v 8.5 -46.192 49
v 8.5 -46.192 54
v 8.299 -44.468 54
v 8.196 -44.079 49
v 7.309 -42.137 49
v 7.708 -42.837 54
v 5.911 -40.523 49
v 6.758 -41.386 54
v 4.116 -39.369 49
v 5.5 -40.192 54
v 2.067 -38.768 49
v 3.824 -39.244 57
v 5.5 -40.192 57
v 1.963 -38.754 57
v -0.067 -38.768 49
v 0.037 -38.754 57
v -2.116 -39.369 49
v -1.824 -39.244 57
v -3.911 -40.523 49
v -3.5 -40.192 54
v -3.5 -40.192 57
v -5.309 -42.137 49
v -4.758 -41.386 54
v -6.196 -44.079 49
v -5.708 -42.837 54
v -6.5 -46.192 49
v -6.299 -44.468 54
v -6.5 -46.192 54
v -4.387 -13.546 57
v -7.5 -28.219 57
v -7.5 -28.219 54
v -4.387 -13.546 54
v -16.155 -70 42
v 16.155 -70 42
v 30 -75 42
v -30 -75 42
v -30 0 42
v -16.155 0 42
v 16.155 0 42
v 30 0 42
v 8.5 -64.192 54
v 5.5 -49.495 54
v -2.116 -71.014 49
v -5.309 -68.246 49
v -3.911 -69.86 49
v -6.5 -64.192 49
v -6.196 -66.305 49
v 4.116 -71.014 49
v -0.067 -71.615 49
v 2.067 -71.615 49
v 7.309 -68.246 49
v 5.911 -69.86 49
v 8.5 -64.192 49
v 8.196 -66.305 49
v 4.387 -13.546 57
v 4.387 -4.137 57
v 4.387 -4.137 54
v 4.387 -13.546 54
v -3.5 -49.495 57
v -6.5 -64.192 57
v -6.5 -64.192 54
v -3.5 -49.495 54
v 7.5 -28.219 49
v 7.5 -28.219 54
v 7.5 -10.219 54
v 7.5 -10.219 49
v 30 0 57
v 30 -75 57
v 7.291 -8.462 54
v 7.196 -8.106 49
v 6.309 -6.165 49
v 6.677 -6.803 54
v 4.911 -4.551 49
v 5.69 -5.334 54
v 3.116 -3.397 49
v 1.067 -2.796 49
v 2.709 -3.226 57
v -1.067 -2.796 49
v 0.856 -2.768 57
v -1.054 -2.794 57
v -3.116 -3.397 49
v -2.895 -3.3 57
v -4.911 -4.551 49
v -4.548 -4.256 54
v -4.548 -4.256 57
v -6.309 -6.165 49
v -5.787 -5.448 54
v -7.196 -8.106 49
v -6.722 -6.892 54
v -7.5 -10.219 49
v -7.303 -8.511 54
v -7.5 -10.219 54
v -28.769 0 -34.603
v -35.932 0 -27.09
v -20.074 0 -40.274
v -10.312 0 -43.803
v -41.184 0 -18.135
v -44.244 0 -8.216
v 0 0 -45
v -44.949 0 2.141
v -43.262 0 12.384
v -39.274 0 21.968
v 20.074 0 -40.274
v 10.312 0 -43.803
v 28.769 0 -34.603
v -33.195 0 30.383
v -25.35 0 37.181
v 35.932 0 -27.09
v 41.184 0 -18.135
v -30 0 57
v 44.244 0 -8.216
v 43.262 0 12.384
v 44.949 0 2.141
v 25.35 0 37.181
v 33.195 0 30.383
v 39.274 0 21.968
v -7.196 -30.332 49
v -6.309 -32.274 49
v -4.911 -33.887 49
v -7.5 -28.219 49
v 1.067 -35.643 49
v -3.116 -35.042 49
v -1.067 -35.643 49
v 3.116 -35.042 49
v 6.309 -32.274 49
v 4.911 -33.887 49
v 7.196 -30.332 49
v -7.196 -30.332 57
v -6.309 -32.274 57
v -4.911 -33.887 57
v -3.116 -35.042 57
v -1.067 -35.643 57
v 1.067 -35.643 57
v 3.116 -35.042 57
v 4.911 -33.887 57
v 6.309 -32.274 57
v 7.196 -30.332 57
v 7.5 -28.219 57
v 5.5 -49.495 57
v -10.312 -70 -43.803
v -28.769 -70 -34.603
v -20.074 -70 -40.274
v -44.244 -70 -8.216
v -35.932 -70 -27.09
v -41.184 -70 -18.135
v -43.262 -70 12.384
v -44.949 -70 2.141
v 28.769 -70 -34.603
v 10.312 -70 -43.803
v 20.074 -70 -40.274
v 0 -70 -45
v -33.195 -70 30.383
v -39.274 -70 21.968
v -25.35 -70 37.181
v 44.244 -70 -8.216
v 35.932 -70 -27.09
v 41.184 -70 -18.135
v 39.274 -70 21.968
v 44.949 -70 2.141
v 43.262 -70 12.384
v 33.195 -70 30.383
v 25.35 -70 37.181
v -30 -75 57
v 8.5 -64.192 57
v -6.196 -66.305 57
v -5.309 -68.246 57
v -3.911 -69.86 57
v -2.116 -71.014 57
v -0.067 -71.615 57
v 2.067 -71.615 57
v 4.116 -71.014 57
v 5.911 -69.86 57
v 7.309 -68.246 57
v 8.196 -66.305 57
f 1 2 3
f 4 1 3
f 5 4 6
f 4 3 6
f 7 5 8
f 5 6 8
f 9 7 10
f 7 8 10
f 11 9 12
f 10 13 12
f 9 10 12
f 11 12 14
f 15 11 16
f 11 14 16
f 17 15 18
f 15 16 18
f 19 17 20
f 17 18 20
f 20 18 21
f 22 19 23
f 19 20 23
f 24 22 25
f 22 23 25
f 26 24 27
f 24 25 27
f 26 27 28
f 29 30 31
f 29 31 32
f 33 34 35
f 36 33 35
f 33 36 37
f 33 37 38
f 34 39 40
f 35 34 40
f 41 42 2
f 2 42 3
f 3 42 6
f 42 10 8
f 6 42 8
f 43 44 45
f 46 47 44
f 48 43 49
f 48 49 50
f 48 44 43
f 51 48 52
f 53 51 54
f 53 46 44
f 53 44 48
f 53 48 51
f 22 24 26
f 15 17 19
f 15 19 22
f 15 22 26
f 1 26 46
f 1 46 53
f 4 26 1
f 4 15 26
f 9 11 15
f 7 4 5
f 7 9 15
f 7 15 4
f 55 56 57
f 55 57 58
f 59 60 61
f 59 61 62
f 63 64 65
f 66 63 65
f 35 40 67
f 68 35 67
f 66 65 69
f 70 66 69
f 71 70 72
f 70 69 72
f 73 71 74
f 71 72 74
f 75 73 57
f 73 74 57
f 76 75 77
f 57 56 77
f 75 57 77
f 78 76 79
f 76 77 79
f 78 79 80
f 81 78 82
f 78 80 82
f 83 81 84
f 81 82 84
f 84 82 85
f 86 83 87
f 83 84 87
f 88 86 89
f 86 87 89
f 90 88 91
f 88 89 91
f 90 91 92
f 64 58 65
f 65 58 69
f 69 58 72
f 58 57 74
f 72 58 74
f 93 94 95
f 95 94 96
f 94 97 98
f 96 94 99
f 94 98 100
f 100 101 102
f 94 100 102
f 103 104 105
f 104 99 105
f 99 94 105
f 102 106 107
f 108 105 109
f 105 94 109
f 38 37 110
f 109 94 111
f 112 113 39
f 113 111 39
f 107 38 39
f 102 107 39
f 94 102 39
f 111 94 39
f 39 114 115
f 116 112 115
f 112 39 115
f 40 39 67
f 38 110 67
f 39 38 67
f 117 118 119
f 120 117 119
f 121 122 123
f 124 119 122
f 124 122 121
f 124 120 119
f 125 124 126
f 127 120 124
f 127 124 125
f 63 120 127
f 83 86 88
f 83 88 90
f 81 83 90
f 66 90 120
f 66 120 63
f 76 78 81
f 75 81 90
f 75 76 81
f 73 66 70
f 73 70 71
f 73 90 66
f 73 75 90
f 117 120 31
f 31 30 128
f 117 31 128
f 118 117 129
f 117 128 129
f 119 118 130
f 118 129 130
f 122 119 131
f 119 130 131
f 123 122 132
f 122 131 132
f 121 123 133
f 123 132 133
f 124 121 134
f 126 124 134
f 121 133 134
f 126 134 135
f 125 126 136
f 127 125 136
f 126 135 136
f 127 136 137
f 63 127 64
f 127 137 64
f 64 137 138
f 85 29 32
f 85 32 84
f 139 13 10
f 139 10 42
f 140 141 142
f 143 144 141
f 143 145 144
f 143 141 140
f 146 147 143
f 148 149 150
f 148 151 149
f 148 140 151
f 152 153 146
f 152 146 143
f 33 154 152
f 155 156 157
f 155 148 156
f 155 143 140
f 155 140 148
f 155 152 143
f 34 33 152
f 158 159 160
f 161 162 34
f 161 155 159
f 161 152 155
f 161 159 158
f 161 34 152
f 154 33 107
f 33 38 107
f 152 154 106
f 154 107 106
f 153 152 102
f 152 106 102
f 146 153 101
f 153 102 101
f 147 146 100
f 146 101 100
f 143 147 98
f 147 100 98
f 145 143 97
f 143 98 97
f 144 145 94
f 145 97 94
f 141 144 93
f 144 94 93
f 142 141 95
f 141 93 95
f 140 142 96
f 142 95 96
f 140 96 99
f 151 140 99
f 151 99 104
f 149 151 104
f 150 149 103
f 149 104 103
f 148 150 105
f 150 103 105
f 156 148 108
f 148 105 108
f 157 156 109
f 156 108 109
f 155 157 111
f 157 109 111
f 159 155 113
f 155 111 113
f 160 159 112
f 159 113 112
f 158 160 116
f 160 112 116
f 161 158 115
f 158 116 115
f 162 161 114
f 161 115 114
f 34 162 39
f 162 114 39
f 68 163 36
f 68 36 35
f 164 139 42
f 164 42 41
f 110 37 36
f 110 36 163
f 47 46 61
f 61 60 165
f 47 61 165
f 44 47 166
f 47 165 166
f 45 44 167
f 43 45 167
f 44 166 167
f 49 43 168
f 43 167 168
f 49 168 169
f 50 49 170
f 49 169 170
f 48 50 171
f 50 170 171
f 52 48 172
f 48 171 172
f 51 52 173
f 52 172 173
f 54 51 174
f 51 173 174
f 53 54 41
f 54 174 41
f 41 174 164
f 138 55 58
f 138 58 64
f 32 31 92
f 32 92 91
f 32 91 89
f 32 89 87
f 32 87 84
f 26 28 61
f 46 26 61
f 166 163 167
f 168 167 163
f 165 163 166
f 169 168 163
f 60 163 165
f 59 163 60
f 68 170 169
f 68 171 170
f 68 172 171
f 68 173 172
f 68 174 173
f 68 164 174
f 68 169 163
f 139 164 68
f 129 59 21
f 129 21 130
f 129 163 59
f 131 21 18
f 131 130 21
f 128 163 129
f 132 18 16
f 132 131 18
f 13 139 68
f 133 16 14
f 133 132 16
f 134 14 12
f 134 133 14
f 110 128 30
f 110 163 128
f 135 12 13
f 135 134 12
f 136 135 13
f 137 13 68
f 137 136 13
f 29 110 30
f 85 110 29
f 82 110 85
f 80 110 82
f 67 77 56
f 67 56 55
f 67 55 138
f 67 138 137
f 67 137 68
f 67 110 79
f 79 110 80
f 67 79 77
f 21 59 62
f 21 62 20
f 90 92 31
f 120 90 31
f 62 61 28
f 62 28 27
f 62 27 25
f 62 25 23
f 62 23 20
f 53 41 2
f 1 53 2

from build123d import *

# Parameters (mm, degrees)
F0_R     = 45
F1_DEPTH = 70
F2_W     = 60
F2_H     = 15
F3_DEPTH = 75
F5_DEPTH = 8
F7_DEPTH = 3


with BuildPart() as f1:
    # F0 (on Front) → F1 (new body)
    with BuildSketch(Plane.XZ):
        Circle(F0_R)
    extrude(amount=F1_DEPTH)

    # F2 (on Front) → F3 (join)
    with BuildSketch(Plane.XZ):
        with Locations((0, 49.5)):
            Rectangle(F2_W, F2_H)
    extrude(amount=F3_DEPTH)

    # F4 (on face) → F5 (cut)
    with BuildSketch(Plane.XY.offset(57)):
        with BuildLine():
            Line((7.5, -28.2193734366), (-7.5, -28.2193734366))
            ThreePointArc((-7.5, -28.2193734366), (0, -35.7193734366), (7.5, -28.2193734366))
        make_face()
        with BuildLine():
            ThreePointArc((7.5, -28.2193734366), (0, -20.7193734366), (-7.5, -28.2193734366))
            Line((-7.5, -28.2193734366), (7.5, -28.2193734366))
        make_face()
        with BuildLine():
            Line((7.5, -10.2193734366), (-7.5, -10.2193734366))
            ThreePointArc((-7.5, -10.2193734366), (0, -17.7193734366), (7.5, -10.2193734366))
        make_face()
        with BuildLine():
            Line((8.5, -46.1915741923), (-6.5, -46.1915741923))
            ThreePointArc((-6.5, -46.1915741923), (1, -53.6915741923), (8.5, -46.1915741923))
        make_face()
        with BuildLine():
            ThreePointArc((8.5, -64.1915741923), (1, -56.6915741923), (-6.5, -64.1915741923))
            Line((-6.5, -64.1915741923), (8.5, -64.1915741923))
        make_face()
        with BuildLine():
            Line((8.5, -64.1915741923), (-6.5, -64.1915741923))
            ThreePointArc((-6.5, -64.1915741923), (1, -71.6915741923), (8.5, -64.1915741923))
        make_face()
        with BuildLine():
            ThreePointArc((8.5, -46.1915741923), (1, -38.6915741923), (-6.5, -46.1915741923))
            Line((-6.5, -46.1915741923), (8.5, -46.1915741923))
        make_face()
        with BuildLine():
            ThreePointArc((7.5, -10.2193734366), (0, -2.7193734366), (-7.5, -10.2193734366))
            Line((-7.5, -10.2193734366), (7.5, -10.2193734366))
        make_face()
        with BuildLine():
            ThreePointArc((7.5, -10.2193734366), (0, -17.7193734366), (-7.5, -10.2193734366))
            Line((-7.5, -10.2193734366), (-7.5, -28.2193734366))
            ThreePointArc((-7.5, -28.2193734366), (0, -20.7193734366), (7.5, -28.2193734366))
            Line((7.5, -28.2193734366), (7.5, -10.2193734366))
        make_face()
        with BuildLine():
            ThreePointArc((8.5, -46.1915741923), (1, -53.6915741923), (-6.5, -46.1915741923))
            Line((-6.5, -46.1915741923), (-6.5, -64.1915741923))
            ThreePointArc((-6.5, -64.1915741923), (1, -56.6915741923), (8.5, -64.1915741923))
            Line((8.5, -64.1915741923), (8.5, -46.1915741923))
        make_face()
    extrude(amount=-F5_DEPTH, mode=Mode.SUBTRACT)

    # F6 (on face) → F7 (join)
    with BuildSketch(Plane.XY.offset(57)):
        with BuildLine():
            Line((-7.5, -10.2193734366), (-7.5, -28.2193734366))
            Line((-7.5, -28.2193734366), (-4.3874821937, -13.5458519471))
            Line((-4.3874821937, -13.5458519471), (-4.5479531951, -4.2556395614))
            ThreePointArc((-4.5479531951, -4.2556395614), (-6.7215938944, -6.8921861082), (-7.5, -10.2193734366))
        make_face()
        with BuildLine():
            Line((4.3874821937, -13.5458519471), (7.5, -28.2193734366))
            Line((7.5, -28.2193734366), (7.5, -10.2193734366))
            ThreePointArc((7.5, -10.2193734366), (6.67668018, -6.802951072), (4.3874821937, -4.1366109064))
            Line((4.3874821937, -4.1366109064), (4.3874821937, -13.5458519471))
        make_face()
        with BuildLine():
            Line((5.5, -49.4946357356), (8.5, -64.1915741923))
            Line((8.5, -64.1915741923), (8.5, -46.1915741923))
            ThreePointArc((8.5, -46.1915741923), (7.7082039325, -42.837472226), (5.5, -40.1915741923))
            Line((5.5, -40.1915741923), (5.5, -49.4946357356))
        make_face()
        with BuildLine():
            Line((-6.5, -46.1915741923), (-6.5, -64.1915741923))
            Line((-6.5, -64.1915741923), (-3.5, -49.4946357356))
            Line((-3.5, -49.4946357356), (-3.5, -40.1915741923))
            ThreePointArc((-3.5, -40.1915741923), (-5.7082039325, -42.837472226), (-6.5, -46.1915741923))
        make_face()
    extrude(amount=-F7_DEPTH)


solid = f1.part
